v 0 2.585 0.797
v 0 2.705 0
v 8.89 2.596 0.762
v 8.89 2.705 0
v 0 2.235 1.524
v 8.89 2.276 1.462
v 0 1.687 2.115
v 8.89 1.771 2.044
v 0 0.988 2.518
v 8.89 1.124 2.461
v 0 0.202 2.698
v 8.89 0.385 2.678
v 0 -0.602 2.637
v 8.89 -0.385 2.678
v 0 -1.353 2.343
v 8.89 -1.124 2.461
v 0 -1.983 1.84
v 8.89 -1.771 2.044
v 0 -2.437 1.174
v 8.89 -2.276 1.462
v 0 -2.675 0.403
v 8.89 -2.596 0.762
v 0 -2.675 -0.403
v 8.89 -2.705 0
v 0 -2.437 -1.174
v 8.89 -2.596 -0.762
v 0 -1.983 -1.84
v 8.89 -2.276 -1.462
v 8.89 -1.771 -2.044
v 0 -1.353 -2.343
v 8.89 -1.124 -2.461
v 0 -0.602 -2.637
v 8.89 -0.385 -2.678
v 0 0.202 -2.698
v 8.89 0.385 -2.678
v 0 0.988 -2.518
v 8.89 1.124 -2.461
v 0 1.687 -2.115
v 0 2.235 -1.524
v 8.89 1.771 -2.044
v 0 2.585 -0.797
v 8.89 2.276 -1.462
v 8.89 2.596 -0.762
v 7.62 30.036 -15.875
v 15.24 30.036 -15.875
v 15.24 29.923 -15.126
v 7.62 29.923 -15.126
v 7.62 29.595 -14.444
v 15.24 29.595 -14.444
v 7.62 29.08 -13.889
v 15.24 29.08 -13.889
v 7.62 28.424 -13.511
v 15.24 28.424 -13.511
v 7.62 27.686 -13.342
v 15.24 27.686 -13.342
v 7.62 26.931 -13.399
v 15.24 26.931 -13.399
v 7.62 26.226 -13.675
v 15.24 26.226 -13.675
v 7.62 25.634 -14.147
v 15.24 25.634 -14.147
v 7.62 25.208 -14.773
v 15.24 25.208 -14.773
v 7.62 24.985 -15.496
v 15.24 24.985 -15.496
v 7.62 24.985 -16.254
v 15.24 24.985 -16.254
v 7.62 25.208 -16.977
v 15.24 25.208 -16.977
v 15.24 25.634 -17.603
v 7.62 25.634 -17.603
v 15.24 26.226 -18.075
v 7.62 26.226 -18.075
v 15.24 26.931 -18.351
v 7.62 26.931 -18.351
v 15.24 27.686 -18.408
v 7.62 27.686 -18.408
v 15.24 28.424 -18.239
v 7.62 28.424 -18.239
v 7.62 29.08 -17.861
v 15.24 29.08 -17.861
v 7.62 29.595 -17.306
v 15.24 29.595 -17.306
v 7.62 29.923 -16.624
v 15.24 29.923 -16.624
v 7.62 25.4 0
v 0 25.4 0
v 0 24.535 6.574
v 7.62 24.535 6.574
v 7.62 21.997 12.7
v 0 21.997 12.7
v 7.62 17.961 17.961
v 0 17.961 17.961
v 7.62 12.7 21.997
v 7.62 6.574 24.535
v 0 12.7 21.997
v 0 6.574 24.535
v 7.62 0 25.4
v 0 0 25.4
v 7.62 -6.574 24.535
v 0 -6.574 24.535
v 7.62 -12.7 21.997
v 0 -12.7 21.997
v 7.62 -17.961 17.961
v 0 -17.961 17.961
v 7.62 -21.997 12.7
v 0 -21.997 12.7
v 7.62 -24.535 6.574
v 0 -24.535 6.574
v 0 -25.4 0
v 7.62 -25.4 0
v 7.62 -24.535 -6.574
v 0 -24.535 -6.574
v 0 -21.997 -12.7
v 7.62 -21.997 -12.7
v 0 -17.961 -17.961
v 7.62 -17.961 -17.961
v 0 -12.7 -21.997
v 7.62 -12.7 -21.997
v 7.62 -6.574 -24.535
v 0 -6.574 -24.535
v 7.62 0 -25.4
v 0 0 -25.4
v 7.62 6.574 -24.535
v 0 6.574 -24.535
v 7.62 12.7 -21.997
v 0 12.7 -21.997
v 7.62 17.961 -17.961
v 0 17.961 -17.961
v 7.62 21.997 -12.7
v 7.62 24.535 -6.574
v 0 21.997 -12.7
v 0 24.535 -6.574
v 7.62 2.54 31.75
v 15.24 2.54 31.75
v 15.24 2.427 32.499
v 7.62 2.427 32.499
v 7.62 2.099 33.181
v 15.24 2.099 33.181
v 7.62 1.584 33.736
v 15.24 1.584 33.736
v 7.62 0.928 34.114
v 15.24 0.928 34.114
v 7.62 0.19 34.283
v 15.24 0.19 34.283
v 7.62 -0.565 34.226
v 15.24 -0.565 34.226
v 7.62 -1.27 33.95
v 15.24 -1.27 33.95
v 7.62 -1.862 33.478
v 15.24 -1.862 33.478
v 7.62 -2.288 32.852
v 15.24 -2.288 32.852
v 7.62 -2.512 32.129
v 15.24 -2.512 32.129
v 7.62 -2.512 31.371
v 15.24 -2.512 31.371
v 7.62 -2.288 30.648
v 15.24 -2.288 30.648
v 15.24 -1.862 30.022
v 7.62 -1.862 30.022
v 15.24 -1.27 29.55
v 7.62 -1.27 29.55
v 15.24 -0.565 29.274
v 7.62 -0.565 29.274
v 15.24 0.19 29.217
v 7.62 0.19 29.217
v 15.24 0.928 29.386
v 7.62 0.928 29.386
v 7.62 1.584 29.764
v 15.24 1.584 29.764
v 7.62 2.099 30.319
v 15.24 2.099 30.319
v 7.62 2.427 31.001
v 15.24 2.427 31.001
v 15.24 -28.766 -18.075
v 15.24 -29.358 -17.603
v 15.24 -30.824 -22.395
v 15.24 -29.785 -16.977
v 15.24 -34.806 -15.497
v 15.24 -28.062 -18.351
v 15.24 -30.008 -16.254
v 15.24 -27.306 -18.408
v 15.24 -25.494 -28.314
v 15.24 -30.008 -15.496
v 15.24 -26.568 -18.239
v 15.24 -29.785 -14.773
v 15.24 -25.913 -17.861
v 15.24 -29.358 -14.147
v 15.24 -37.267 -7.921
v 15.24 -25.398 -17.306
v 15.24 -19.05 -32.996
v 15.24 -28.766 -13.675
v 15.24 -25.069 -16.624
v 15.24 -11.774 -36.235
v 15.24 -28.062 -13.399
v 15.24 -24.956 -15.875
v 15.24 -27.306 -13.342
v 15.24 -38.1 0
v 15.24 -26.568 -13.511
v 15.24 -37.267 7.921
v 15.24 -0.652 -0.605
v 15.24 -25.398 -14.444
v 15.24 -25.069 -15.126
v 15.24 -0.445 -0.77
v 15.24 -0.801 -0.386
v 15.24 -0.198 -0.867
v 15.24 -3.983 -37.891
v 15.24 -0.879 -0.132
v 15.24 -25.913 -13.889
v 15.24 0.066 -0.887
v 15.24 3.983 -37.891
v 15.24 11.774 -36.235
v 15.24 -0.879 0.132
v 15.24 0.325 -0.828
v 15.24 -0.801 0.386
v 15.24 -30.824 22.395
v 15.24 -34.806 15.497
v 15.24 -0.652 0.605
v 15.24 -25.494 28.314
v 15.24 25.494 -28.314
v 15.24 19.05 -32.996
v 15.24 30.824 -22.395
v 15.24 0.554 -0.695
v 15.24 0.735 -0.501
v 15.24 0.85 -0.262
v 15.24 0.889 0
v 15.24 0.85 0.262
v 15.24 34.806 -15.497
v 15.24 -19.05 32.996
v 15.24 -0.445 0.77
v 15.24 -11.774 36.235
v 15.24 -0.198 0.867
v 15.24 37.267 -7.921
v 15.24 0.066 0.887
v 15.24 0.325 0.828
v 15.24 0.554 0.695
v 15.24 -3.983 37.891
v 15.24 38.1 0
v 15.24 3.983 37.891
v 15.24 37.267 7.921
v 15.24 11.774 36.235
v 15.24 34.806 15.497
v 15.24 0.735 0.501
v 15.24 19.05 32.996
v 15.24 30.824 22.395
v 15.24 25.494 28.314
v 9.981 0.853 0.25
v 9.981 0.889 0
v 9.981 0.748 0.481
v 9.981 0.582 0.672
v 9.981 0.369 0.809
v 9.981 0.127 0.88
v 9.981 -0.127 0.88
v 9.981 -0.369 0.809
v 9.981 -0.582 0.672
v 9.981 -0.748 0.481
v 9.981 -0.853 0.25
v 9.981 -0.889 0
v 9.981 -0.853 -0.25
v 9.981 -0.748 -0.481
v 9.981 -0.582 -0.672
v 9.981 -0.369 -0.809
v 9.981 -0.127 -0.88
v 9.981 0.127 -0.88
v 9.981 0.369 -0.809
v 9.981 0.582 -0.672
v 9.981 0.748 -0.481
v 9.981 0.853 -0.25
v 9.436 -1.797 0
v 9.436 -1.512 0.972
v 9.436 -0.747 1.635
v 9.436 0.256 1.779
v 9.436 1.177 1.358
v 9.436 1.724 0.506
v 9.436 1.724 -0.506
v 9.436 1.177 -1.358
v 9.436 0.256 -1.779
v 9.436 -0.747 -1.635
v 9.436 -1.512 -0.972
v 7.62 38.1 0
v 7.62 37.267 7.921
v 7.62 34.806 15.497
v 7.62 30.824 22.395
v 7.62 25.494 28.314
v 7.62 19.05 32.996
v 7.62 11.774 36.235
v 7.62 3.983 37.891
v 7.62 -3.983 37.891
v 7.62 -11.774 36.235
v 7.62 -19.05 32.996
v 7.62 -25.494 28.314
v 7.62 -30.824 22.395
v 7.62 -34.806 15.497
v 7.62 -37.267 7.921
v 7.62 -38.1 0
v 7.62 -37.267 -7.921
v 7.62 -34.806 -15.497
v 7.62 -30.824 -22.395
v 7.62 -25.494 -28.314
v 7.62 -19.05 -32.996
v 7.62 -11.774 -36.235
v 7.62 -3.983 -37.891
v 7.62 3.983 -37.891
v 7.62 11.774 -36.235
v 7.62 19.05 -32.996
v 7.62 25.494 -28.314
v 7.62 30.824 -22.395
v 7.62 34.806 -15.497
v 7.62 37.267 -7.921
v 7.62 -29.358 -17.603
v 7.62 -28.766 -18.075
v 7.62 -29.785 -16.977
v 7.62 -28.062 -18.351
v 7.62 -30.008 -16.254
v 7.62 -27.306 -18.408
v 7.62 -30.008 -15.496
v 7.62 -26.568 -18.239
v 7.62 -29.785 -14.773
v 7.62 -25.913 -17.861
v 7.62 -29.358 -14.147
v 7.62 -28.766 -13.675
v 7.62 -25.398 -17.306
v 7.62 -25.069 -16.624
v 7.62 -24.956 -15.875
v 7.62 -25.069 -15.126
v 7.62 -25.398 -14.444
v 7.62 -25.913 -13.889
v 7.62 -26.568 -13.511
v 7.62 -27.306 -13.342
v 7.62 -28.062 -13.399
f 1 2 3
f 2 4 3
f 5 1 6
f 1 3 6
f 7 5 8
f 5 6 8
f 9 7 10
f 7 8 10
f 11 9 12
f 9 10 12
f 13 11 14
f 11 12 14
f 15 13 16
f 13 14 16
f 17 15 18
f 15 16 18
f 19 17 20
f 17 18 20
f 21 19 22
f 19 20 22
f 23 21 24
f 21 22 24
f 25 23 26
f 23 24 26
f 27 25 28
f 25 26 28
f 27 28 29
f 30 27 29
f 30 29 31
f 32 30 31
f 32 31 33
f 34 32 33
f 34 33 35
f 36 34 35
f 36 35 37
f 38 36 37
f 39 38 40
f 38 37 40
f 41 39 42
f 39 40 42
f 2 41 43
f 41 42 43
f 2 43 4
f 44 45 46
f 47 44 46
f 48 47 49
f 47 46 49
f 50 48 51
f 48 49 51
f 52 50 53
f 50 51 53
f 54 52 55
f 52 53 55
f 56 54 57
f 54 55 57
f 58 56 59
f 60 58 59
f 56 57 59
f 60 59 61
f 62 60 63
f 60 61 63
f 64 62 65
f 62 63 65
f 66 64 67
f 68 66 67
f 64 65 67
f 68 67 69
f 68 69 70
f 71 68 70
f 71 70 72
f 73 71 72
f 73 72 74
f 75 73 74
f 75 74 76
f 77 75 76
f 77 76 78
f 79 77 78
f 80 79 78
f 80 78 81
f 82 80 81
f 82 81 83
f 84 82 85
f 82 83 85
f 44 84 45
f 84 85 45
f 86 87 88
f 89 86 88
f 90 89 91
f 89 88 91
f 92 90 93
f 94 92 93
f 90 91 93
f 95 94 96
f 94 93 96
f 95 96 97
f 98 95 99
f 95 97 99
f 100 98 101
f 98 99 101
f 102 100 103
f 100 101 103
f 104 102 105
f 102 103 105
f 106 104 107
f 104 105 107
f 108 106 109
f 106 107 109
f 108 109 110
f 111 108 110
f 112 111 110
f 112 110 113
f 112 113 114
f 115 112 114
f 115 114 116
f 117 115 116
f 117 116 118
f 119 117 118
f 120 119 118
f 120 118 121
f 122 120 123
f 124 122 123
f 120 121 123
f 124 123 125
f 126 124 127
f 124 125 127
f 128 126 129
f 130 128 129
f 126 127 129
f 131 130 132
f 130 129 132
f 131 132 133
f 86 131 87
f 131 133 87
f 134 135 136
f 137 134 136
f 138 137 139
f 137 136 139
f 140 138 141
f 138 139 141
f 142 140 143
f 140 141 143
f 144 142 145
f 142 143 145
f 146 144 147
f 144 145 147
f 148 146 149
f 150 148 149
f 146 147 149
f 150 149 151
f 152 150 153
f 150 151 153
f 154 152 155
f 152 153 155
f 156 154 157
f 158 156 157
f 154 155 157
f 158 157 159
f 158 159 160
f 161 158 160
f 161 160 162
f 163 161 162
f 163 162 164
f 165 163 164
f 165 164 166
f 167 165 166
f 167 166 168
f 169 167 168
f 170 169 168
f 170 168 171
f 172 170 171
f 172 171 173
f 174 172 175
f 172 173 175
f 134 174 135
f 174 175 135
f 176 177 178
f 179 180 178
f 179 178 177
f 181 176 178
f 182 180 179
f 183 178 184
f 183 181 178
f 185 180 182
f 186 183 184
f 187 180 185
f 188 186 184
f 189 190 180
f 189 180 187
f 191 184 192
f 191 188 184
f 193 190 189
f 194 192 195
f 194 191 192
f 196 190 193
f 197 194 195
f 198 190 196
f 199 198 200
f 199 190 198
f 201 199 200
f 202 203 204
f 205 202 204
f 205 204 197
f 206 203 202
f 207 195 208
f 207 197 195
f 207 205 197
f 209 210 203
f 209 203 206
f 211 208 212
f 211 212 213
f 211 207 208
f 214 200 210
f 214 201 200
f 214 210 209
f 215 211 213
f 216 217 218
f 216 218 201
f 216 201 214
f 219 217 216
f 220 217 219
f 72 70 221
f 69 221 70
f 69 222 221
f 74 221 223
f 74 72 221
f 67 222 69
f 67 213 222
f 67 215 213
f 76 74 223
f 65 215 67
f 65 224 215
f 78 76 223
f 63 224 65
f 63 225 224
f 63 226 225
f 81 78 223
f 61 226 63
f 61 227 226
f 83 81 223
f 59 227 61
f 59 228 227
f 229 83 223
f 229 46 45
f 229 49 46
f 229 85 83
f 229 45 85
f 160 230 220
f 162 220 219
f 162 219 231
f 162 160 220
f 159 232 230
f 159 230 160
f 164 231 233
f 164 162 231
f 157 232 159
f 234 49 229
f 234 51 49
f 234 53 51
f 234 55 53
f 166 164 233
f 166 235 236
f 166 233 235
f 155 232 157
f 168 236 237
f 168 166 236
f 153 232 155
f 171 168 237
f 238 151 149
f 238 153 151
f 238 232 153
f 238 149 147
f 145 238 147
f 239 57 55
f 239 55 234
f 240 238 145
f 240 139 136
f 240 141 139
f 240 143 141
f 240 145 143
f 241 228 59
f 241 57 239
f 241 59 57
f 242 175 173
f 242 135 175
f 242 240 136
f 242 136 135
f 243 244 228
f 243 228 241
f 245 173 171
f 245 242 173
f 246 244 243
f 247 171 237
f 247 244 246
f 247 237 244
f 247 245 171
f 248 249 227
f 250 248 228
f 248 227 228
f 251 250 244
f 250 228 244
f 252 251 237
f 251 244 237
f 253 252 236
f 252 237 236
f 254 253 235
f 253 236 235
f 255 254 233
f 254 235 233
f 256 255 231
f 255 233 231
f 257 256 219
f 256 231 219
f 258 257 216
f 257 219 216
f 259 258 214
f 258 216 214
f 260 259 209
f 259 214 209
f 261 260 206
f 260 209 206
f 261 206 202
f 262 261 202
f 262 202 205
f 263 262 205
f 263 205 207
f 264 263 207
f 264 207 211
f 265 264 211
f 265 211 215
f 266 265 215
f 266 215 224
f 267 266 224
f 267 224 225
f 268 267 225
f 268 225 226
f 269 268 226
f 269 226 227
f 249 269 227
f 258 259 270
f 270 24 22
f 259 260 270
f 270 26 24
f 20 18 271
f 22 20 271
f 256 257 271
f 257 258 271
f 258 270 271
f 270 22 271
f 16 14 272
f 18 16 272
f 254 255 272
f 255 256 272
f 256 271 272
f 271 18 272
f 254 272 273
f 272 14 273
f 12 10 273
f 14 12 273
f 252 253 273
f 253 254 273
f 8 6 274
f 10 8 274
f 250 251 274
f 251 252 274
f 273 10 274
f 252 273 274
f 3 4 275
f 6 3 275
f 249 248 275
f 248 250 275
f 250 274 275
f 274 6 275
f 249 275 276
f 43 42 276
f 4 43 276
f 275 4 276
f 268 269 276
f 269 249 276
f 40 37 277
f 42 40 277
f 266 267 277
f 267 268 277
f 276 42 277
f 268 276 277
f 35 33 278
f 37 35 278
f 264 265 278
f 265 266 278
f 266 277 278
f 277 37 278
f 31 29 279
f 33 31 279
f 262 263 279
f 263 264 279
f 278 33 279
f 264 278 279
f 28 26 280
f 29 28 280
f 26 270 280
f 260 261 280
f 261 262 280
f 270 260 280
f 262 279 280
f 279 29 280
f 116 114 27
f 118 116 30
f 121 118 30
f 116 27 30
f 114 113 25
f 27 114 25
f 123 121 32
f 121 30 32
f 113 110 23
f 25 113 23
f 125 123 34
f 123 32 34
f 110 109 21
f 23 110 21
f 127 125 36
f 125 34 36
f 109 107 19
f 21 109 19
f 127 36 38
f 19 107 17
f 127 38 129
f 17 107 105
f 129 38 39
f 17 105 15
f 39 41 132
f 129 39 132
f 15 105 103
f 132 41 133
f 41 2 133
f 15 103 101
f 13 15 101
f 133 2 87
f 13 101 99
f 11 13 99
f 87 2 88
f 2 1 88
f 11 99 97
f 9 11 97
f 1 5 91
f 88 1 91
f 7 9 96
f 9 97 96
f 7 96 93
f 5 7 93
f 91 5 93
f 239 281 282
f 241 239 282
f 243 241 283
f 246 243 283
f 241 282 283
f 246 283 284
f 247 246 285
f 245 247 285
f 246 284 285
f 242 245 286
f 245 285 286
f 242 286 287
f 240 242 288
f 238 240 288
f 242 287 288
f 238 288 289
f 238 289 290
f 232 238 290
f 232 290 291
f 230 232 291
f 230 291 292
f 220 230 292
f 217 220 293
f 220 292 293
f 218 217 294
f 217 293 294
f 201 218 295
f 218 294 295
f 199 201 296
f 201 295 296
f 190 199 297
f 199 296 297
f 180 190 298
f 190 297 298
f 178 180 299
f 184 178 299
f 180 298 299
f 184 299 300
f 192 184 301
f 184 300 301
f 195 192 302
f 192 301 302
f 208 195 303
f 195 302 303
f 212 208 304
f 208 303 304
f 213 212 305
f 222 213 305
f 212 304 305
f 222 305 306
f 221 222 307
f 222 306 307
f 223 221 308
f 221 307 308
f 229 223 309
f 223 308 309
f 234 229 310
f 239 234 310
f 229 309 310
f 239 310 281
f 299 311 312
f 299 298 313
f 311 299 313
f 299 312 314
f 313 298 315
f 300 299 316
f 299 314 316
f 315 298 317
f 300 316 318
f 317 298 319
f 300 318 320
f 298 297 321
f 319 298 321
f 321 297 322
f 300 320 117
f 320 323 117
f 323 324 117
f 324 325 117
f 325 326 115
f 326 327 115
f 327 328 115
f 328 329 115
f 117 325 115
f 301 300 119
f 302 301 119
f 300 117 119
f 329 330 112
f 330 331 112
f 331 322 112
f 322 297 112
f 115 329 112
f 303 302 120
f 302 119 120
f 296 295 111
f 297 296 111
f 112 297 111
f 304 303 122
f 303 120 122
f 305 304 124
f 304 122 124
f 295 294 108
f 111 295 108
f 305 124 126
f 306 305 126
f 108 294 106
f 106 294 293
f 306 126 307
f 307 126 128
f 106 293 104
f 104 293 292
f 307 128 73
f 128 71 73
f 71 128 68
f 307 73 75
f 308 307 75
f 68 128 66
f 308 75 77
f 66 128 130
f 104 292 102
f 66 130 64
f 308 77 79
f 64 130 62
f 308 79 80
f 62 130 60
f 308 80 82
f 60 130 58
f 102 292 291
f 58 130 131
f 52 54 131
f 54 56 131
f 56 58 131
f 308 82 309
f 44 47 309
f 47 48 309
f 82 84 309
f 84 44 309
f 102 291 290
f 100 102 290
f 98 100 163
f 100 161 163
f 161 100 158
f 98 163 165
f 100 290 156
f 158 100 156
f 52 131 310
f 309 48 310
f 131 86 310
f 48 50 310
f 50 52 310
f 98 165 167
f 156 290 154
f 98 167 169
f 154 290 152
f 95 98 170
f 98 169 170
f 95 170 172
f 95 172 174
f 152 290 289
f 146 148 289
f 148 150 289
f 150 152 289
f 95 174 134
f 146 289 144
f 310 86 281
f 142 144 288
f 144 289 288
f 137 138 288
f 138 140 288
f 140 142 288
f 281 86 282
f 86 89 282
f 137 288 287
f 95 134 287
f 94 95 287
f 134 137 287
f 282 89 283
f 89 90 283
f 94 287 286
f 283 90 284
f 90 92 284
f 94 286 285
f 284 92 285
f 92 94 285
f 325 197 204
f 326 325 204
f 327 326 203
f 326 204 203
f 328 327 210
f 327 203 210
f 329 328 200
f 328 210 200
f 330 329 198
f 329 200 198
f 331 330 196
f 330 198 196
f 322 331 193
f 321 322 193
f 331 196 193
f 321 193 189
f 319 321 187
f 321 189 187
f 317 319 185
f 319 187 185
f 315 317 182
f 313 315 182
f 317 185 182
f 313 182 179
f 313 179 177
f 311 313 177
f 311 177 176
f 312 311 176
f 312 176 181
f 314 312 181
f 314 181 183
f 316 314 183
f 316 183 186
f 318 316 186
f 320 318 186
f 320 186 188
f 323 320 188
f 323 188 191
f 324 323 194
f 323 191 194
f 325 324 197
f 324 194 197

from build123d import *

# Parameters (mm, degrees)
F0_R       = 25.4
F1_DEPTH   = 7.62
F2_R       = 38.1
F1_FACE1_R = 25.4
F3_DEPTH   = 7.62
F4_R       = 2.54
F5_DEPTH   = 7.62
F7_D       = 5.4102
F7_DEPTH   = 8.89
F7_TIP     = 1.6253880605
F8_D       = 1.778


with BuildPart() as f1:
    # F0 (on Right) → F1 (new body)
    with BuildSketch(Plane.YZ):
        Circle(F0_R)
    extrude(amount=F1_DEPTH)

    # F2 (on face) + F1_face1 (on face) → F3 (join)
    with BuildSketch(Plane.YZ.offset(7.62)):
        Circle(F2_R)
    with BuildSketch(Plane(origin=(0, 0, 0), x_dir=(0, 1, 0), z_dir=(-1, 0, 0))):
        Circle(F1_FACE1_R)
    extrude(amount=F3_DEPTH, dir=(1, 0, 0))

    # F4 (on face) → F5 (cut)
    with BuildSketch(Plane.YZ.offset(15.24)):
        with Locations((0, 31.75)):
            Circle(F4_R)
        with Locations((27.4963065702, -15.875)):
            Circle(F4_R)
        with Locations((-27.4963065702, -15.875)):
            Circle(F4_R)
    extrude(amount=-F5_DEPTH, mode=Mode.SUBTRACT)

    # F7
    with Locations(Plane(origin=(0, 0, 0), x_dir=(0, -1, 0), z_dir=(-1, 0, 0))):
        with Locations((0, 0)):
            Hole(F7_D / 2, depth=F7_DEPTH)
            with Locations((0, 0, -(F7_DEPTH + F7_TIP / 2))):  # 118° drill point
                Cone(0, F7_D / 2, F7_TIP, mode=Mode.SUBTRACT)

    # F8 (through all)
    with Locations(Plane(origin=(0, 0, 0), x_dir=(0, -1, 0), z_dir=(-1, 0, 0))):
        with Locations((0, 0)):
            Hole(F8_D / 2)


solid = f1.part
